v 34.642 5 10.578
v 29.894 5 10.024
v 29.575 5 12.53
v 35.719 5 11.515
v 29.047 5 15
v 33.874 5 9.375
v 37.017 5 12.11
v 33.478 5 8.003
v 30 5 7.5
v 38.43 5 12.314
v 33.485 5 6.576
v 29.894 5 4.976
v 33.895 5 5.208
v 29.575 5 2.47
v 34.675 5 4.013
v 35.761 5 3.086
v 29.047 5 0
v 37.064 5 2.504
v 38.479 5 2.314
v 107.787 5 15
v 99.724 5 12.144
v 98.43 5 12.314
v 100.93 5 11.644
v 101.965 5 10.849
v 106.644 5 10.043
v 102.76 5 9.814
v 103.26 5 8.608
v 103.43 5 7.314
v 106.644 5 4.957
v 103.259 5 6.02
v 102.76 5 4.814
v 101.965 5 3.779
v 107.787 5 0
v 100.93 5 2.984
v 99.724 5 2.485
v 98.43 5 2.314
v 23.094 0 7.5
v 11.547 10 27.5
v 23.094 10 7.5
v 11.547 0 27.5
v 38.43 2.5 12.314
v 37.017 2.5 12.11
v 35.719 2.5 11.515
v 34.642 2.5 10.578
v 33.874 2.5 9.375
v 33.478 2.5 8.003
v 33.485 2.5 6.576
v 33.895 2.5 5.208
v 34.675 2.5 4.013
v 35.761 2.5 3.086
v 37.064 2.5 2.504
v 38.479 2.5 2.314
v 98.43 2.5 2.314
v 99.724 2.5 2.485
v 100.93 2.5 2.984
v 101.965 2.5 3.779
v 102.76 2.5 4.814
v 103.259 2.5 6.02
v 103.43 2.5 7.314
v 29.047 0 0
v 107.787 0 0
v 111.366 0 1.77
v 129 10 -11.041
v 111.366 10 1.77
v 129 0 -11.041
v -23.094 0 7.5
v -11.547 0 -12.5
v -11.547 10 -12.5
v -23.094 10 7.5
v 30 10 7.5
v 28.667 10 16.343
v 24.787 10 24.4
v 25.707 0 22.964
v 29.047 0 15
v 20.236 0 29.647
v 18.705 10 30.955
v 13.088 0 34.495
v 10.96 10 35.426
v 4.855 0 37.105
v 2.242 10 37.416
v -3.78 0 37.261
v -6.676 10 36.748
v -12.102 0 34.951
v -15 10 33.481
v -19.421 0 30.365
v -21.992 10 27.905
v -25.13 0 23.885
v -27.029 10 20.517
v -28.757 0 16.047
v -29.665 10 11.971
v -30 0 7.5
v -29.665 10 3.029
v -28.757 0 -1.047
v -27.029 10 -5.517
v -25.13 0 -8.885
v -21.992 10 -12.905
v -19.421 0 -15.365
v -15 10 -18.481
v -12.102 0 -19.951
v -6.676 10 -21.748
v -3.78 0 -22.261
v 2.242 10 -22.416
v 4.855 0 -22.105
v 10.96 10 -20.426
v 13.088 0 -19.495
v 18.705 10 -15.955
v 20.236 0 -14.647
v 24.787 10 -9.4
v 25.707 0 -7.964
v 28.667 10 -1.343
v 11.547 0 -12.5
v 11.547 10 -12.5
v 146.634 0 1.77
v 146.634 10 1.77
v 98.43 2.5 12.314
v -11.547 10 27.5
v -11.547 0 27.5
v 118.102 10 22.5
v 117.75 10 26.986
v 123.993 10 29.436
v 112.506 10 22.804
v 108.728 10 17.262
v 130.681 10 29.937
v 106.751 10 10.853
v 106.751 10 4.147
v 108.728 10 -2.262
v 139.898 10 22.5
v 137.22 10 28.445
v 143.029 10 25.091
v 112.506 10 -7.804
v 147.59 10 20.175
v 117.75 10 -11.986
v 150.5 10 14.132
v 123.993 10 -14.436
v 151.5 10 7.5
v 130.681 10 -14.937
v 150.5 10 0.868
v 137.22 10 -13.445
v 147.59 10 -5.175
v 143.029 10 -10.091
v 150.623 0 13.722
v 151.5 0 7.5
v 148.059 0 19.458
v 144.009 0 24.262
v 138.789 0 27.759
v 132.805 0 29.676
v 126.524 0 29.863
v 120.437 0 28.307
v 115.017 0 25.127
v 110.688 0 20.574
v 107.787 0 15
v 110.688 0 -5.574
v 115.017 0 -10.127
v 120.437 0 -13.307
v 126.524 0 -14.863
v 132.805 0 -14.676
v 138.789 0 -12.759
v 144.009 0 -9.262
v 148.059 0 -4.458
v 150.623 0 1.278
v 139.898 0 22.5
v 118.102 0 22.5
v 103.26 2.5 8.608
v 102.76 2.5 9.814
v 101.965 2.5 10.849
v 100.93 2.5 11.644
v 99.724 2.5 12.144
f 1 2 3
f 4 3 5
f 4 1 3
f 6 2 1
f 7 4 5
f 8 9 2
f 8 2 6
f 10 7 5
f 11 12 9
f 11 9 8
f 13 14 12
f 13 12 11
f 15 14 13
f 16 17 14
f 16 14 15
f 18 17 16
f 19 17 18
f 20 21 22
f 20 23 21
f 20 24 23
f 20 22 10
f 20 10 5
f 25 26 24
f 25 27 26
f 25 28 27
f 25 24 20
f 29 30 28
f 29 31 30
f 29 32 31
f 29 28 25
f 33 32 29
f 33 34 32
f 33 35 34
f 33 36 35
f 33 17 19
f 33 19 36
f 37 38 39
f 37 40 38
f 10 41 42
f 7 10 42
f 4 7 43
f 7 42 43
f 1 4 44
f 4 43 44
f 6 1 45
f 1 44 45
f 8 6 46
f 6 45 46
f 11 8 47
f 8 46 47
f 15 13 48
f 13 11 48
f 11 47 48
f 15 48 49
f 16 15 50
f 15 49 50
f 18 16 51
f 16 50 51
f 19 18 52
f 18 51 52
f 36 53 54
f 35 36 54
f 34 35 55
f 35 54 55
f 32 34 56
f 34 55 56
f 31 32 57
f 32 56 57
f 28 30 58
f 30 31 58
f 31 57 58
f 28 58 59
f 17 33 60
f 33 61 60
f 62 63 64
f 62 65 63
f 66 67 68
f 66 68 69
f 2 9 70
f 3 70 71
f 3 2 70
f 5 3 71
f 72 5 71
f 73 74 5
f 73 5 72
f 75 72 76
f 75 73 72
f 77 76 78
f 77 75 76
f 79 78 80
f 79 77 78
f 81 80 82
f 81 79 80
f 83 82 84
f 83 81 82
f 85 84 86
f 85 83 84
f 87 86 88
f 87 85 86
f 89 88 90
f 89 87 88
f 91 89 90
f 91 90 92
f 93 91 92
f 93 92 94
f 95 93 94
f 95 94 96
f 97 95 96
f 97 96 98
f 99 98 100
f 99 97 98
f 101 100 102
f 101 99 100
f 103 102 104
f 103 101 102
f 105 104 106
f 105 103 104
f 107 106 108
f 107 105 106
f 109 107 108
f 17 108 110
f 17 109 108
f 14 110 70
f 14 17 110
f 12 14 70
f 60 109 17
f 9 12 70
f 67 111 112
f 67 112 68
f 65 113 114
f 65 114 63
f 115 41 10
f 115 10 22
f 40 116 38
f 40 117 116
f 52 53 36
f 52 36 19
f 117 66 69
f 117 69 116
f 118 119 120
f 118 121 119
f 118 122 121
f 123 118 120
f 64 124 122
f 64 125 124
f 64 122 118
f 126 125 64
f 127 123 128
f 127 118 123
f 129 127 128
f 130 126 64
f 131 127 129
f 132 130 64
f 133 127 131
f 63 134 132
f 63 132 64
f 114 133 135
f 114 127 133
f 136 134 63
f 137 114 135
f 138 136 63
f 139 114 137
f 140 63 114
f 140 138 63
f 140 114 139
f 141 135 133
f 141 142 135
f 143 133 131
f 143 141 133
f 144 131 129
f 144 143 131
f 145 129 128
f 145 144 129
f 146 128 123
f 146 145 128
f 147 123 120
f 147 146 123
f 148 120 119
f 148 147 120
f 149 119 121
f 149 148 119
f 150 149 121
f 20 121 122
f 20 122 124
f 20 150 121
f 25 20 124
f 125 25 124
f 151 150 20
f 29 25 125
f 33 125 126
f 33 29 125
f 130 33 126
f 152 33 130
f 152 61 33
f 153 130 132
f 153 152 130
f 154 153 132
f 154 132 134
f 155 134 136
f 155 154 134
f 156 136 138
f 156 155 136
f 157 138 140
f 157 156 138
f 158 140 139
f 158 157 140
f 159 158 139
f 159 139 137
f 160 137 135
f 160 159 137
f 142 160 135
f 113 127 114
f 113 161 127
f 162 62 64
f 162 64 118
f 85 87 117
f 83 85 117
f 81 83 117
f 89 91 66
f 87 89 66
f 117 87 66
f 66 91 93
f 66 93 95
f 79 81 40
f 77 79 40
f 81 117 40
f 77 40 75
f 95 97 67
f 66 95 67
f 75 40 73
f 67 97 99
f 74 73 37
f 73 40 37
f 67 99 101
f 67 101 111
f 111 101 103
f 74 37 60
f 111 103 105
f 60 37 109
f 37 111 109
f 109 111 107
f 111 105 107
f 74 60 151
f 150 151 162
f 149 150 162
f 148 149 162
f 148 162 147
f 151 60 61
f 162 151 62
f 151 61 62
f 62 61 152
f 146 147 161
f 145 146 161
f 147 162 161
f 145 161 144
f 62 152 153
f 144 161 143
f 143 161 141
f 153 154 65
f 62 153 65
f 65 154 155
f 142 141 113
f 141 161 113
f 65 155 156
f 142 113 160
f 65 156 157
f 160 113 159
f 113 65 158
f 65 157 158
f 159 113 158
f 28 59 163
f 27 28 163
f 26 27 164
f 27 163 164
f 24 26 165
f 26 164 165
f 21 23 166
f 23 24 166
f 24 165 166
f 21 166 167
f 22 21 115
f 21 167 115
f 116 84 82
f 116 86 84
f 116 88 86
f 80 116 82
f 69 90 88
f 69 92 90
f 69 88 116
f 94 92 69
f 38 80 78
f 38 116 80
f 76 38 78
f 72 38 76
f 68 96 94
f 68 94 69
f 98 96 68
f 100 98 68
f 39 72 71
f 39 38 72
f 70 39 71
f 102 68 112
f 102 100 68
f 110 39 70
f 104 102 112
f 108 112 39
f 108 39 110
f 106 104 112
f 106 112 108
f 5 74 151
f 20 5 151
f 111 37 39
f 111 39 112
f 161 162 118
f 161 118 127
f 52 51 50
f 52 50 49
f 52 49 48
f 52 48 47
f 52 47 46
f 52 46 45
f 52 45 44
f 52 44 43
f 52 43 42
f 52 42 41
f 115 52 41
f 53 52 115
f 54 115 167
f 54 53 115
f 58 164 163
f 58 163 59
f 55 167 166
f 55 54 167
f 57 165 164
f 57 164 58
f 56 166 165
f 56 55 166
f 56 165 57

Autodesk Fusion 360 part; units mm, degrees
sketch "Sketch1" plane through (0, 0, 0) normal (0, 1, 0) x (1, 0, 0)
  line L0 (139.8981, -22.5) -> (146.6336, -1.7705)
  line L1 (146.6336, -1.7705) -> (129, 11.041)
  line L2 (129, 11.041) -> (111.3664, -1.7705)
  line L3 (111.3664, -1.7705) -> (118.1019, -22.5)
  line L4 (118.1019, -22.5) -> (139.8981, -22.5)
  line L5 (11.547, -27.5) -> (23.094, -7.5)
  line L6 (23.094, -7.5) -> (11.547, 12.5)
  line L7 (11.547, 12.5) -> (-11.547, 12.5)
  line L8 (-11.547, 12.5) -> (-23.094, -7.5)
  line L9 (-23.094, -7.5) -> (-11.547, -27.5)
  line L10 (-11.547, -27.5) -> (11.547, -27.5)
  circle A0 centre (0, -7.5) radius 30
  circle A1 centre (129, -7.5) radius 22.5
  line L11 (38.4299, -12.3139) -> (98.4299, -12.3139)
  line L12 (103.4299, -7.3139) -> (103.4299, -7.3123)
  line L13 (98.4299, -2.3142) -> (38.479, -2.3142)
  line L14 (38.7, -2.3142) -> (38.479, -2.3142)
  arc A2 (38.479, -2.3142) -> (38.4299, -12.3139) centre (38.4299, -7.3139) ccw
  arc A3 (103.4299, -7.3123) -> (98.4299, -2.3142) centre (98.4299, -7.3142) ccw
  arc A4 (98.4299, -12.3139) -> (103.4299, -7.3139) centre (98.4299, -7.3139) ccw
  line L15 (28.6408, -15) -> (109.0777, -15)
  line L16 (109.0777, 0) -> (28.6408, 0)
  point P0 (0, -7.5)
  point P1 (129, -7.5)
  point P2 (103.4299, -12.3139)
  dimension "d2" = 20
  dimension "d3" = 60
  dimension "d4" = 45
  dimension "d7" = 5
extrude "Extrude1" add sketch "Sketch1" along normal blind 10 contours A0 | A1 makes body 1 at (-13.6863, 6.6667, 34.1962) makes body 2 at (151.3882, 3.3333, 9.7403)
extrude "Extrude2" add sketch "Sketch1" along normal blind 5 contours A0 A1 L15 L16 bodies 1 2
extrude "Extrude3" add sketch "Sketch1" along normal blind 2.5 contours L11 L13 L14 A2 A3 A4 bodies 1
